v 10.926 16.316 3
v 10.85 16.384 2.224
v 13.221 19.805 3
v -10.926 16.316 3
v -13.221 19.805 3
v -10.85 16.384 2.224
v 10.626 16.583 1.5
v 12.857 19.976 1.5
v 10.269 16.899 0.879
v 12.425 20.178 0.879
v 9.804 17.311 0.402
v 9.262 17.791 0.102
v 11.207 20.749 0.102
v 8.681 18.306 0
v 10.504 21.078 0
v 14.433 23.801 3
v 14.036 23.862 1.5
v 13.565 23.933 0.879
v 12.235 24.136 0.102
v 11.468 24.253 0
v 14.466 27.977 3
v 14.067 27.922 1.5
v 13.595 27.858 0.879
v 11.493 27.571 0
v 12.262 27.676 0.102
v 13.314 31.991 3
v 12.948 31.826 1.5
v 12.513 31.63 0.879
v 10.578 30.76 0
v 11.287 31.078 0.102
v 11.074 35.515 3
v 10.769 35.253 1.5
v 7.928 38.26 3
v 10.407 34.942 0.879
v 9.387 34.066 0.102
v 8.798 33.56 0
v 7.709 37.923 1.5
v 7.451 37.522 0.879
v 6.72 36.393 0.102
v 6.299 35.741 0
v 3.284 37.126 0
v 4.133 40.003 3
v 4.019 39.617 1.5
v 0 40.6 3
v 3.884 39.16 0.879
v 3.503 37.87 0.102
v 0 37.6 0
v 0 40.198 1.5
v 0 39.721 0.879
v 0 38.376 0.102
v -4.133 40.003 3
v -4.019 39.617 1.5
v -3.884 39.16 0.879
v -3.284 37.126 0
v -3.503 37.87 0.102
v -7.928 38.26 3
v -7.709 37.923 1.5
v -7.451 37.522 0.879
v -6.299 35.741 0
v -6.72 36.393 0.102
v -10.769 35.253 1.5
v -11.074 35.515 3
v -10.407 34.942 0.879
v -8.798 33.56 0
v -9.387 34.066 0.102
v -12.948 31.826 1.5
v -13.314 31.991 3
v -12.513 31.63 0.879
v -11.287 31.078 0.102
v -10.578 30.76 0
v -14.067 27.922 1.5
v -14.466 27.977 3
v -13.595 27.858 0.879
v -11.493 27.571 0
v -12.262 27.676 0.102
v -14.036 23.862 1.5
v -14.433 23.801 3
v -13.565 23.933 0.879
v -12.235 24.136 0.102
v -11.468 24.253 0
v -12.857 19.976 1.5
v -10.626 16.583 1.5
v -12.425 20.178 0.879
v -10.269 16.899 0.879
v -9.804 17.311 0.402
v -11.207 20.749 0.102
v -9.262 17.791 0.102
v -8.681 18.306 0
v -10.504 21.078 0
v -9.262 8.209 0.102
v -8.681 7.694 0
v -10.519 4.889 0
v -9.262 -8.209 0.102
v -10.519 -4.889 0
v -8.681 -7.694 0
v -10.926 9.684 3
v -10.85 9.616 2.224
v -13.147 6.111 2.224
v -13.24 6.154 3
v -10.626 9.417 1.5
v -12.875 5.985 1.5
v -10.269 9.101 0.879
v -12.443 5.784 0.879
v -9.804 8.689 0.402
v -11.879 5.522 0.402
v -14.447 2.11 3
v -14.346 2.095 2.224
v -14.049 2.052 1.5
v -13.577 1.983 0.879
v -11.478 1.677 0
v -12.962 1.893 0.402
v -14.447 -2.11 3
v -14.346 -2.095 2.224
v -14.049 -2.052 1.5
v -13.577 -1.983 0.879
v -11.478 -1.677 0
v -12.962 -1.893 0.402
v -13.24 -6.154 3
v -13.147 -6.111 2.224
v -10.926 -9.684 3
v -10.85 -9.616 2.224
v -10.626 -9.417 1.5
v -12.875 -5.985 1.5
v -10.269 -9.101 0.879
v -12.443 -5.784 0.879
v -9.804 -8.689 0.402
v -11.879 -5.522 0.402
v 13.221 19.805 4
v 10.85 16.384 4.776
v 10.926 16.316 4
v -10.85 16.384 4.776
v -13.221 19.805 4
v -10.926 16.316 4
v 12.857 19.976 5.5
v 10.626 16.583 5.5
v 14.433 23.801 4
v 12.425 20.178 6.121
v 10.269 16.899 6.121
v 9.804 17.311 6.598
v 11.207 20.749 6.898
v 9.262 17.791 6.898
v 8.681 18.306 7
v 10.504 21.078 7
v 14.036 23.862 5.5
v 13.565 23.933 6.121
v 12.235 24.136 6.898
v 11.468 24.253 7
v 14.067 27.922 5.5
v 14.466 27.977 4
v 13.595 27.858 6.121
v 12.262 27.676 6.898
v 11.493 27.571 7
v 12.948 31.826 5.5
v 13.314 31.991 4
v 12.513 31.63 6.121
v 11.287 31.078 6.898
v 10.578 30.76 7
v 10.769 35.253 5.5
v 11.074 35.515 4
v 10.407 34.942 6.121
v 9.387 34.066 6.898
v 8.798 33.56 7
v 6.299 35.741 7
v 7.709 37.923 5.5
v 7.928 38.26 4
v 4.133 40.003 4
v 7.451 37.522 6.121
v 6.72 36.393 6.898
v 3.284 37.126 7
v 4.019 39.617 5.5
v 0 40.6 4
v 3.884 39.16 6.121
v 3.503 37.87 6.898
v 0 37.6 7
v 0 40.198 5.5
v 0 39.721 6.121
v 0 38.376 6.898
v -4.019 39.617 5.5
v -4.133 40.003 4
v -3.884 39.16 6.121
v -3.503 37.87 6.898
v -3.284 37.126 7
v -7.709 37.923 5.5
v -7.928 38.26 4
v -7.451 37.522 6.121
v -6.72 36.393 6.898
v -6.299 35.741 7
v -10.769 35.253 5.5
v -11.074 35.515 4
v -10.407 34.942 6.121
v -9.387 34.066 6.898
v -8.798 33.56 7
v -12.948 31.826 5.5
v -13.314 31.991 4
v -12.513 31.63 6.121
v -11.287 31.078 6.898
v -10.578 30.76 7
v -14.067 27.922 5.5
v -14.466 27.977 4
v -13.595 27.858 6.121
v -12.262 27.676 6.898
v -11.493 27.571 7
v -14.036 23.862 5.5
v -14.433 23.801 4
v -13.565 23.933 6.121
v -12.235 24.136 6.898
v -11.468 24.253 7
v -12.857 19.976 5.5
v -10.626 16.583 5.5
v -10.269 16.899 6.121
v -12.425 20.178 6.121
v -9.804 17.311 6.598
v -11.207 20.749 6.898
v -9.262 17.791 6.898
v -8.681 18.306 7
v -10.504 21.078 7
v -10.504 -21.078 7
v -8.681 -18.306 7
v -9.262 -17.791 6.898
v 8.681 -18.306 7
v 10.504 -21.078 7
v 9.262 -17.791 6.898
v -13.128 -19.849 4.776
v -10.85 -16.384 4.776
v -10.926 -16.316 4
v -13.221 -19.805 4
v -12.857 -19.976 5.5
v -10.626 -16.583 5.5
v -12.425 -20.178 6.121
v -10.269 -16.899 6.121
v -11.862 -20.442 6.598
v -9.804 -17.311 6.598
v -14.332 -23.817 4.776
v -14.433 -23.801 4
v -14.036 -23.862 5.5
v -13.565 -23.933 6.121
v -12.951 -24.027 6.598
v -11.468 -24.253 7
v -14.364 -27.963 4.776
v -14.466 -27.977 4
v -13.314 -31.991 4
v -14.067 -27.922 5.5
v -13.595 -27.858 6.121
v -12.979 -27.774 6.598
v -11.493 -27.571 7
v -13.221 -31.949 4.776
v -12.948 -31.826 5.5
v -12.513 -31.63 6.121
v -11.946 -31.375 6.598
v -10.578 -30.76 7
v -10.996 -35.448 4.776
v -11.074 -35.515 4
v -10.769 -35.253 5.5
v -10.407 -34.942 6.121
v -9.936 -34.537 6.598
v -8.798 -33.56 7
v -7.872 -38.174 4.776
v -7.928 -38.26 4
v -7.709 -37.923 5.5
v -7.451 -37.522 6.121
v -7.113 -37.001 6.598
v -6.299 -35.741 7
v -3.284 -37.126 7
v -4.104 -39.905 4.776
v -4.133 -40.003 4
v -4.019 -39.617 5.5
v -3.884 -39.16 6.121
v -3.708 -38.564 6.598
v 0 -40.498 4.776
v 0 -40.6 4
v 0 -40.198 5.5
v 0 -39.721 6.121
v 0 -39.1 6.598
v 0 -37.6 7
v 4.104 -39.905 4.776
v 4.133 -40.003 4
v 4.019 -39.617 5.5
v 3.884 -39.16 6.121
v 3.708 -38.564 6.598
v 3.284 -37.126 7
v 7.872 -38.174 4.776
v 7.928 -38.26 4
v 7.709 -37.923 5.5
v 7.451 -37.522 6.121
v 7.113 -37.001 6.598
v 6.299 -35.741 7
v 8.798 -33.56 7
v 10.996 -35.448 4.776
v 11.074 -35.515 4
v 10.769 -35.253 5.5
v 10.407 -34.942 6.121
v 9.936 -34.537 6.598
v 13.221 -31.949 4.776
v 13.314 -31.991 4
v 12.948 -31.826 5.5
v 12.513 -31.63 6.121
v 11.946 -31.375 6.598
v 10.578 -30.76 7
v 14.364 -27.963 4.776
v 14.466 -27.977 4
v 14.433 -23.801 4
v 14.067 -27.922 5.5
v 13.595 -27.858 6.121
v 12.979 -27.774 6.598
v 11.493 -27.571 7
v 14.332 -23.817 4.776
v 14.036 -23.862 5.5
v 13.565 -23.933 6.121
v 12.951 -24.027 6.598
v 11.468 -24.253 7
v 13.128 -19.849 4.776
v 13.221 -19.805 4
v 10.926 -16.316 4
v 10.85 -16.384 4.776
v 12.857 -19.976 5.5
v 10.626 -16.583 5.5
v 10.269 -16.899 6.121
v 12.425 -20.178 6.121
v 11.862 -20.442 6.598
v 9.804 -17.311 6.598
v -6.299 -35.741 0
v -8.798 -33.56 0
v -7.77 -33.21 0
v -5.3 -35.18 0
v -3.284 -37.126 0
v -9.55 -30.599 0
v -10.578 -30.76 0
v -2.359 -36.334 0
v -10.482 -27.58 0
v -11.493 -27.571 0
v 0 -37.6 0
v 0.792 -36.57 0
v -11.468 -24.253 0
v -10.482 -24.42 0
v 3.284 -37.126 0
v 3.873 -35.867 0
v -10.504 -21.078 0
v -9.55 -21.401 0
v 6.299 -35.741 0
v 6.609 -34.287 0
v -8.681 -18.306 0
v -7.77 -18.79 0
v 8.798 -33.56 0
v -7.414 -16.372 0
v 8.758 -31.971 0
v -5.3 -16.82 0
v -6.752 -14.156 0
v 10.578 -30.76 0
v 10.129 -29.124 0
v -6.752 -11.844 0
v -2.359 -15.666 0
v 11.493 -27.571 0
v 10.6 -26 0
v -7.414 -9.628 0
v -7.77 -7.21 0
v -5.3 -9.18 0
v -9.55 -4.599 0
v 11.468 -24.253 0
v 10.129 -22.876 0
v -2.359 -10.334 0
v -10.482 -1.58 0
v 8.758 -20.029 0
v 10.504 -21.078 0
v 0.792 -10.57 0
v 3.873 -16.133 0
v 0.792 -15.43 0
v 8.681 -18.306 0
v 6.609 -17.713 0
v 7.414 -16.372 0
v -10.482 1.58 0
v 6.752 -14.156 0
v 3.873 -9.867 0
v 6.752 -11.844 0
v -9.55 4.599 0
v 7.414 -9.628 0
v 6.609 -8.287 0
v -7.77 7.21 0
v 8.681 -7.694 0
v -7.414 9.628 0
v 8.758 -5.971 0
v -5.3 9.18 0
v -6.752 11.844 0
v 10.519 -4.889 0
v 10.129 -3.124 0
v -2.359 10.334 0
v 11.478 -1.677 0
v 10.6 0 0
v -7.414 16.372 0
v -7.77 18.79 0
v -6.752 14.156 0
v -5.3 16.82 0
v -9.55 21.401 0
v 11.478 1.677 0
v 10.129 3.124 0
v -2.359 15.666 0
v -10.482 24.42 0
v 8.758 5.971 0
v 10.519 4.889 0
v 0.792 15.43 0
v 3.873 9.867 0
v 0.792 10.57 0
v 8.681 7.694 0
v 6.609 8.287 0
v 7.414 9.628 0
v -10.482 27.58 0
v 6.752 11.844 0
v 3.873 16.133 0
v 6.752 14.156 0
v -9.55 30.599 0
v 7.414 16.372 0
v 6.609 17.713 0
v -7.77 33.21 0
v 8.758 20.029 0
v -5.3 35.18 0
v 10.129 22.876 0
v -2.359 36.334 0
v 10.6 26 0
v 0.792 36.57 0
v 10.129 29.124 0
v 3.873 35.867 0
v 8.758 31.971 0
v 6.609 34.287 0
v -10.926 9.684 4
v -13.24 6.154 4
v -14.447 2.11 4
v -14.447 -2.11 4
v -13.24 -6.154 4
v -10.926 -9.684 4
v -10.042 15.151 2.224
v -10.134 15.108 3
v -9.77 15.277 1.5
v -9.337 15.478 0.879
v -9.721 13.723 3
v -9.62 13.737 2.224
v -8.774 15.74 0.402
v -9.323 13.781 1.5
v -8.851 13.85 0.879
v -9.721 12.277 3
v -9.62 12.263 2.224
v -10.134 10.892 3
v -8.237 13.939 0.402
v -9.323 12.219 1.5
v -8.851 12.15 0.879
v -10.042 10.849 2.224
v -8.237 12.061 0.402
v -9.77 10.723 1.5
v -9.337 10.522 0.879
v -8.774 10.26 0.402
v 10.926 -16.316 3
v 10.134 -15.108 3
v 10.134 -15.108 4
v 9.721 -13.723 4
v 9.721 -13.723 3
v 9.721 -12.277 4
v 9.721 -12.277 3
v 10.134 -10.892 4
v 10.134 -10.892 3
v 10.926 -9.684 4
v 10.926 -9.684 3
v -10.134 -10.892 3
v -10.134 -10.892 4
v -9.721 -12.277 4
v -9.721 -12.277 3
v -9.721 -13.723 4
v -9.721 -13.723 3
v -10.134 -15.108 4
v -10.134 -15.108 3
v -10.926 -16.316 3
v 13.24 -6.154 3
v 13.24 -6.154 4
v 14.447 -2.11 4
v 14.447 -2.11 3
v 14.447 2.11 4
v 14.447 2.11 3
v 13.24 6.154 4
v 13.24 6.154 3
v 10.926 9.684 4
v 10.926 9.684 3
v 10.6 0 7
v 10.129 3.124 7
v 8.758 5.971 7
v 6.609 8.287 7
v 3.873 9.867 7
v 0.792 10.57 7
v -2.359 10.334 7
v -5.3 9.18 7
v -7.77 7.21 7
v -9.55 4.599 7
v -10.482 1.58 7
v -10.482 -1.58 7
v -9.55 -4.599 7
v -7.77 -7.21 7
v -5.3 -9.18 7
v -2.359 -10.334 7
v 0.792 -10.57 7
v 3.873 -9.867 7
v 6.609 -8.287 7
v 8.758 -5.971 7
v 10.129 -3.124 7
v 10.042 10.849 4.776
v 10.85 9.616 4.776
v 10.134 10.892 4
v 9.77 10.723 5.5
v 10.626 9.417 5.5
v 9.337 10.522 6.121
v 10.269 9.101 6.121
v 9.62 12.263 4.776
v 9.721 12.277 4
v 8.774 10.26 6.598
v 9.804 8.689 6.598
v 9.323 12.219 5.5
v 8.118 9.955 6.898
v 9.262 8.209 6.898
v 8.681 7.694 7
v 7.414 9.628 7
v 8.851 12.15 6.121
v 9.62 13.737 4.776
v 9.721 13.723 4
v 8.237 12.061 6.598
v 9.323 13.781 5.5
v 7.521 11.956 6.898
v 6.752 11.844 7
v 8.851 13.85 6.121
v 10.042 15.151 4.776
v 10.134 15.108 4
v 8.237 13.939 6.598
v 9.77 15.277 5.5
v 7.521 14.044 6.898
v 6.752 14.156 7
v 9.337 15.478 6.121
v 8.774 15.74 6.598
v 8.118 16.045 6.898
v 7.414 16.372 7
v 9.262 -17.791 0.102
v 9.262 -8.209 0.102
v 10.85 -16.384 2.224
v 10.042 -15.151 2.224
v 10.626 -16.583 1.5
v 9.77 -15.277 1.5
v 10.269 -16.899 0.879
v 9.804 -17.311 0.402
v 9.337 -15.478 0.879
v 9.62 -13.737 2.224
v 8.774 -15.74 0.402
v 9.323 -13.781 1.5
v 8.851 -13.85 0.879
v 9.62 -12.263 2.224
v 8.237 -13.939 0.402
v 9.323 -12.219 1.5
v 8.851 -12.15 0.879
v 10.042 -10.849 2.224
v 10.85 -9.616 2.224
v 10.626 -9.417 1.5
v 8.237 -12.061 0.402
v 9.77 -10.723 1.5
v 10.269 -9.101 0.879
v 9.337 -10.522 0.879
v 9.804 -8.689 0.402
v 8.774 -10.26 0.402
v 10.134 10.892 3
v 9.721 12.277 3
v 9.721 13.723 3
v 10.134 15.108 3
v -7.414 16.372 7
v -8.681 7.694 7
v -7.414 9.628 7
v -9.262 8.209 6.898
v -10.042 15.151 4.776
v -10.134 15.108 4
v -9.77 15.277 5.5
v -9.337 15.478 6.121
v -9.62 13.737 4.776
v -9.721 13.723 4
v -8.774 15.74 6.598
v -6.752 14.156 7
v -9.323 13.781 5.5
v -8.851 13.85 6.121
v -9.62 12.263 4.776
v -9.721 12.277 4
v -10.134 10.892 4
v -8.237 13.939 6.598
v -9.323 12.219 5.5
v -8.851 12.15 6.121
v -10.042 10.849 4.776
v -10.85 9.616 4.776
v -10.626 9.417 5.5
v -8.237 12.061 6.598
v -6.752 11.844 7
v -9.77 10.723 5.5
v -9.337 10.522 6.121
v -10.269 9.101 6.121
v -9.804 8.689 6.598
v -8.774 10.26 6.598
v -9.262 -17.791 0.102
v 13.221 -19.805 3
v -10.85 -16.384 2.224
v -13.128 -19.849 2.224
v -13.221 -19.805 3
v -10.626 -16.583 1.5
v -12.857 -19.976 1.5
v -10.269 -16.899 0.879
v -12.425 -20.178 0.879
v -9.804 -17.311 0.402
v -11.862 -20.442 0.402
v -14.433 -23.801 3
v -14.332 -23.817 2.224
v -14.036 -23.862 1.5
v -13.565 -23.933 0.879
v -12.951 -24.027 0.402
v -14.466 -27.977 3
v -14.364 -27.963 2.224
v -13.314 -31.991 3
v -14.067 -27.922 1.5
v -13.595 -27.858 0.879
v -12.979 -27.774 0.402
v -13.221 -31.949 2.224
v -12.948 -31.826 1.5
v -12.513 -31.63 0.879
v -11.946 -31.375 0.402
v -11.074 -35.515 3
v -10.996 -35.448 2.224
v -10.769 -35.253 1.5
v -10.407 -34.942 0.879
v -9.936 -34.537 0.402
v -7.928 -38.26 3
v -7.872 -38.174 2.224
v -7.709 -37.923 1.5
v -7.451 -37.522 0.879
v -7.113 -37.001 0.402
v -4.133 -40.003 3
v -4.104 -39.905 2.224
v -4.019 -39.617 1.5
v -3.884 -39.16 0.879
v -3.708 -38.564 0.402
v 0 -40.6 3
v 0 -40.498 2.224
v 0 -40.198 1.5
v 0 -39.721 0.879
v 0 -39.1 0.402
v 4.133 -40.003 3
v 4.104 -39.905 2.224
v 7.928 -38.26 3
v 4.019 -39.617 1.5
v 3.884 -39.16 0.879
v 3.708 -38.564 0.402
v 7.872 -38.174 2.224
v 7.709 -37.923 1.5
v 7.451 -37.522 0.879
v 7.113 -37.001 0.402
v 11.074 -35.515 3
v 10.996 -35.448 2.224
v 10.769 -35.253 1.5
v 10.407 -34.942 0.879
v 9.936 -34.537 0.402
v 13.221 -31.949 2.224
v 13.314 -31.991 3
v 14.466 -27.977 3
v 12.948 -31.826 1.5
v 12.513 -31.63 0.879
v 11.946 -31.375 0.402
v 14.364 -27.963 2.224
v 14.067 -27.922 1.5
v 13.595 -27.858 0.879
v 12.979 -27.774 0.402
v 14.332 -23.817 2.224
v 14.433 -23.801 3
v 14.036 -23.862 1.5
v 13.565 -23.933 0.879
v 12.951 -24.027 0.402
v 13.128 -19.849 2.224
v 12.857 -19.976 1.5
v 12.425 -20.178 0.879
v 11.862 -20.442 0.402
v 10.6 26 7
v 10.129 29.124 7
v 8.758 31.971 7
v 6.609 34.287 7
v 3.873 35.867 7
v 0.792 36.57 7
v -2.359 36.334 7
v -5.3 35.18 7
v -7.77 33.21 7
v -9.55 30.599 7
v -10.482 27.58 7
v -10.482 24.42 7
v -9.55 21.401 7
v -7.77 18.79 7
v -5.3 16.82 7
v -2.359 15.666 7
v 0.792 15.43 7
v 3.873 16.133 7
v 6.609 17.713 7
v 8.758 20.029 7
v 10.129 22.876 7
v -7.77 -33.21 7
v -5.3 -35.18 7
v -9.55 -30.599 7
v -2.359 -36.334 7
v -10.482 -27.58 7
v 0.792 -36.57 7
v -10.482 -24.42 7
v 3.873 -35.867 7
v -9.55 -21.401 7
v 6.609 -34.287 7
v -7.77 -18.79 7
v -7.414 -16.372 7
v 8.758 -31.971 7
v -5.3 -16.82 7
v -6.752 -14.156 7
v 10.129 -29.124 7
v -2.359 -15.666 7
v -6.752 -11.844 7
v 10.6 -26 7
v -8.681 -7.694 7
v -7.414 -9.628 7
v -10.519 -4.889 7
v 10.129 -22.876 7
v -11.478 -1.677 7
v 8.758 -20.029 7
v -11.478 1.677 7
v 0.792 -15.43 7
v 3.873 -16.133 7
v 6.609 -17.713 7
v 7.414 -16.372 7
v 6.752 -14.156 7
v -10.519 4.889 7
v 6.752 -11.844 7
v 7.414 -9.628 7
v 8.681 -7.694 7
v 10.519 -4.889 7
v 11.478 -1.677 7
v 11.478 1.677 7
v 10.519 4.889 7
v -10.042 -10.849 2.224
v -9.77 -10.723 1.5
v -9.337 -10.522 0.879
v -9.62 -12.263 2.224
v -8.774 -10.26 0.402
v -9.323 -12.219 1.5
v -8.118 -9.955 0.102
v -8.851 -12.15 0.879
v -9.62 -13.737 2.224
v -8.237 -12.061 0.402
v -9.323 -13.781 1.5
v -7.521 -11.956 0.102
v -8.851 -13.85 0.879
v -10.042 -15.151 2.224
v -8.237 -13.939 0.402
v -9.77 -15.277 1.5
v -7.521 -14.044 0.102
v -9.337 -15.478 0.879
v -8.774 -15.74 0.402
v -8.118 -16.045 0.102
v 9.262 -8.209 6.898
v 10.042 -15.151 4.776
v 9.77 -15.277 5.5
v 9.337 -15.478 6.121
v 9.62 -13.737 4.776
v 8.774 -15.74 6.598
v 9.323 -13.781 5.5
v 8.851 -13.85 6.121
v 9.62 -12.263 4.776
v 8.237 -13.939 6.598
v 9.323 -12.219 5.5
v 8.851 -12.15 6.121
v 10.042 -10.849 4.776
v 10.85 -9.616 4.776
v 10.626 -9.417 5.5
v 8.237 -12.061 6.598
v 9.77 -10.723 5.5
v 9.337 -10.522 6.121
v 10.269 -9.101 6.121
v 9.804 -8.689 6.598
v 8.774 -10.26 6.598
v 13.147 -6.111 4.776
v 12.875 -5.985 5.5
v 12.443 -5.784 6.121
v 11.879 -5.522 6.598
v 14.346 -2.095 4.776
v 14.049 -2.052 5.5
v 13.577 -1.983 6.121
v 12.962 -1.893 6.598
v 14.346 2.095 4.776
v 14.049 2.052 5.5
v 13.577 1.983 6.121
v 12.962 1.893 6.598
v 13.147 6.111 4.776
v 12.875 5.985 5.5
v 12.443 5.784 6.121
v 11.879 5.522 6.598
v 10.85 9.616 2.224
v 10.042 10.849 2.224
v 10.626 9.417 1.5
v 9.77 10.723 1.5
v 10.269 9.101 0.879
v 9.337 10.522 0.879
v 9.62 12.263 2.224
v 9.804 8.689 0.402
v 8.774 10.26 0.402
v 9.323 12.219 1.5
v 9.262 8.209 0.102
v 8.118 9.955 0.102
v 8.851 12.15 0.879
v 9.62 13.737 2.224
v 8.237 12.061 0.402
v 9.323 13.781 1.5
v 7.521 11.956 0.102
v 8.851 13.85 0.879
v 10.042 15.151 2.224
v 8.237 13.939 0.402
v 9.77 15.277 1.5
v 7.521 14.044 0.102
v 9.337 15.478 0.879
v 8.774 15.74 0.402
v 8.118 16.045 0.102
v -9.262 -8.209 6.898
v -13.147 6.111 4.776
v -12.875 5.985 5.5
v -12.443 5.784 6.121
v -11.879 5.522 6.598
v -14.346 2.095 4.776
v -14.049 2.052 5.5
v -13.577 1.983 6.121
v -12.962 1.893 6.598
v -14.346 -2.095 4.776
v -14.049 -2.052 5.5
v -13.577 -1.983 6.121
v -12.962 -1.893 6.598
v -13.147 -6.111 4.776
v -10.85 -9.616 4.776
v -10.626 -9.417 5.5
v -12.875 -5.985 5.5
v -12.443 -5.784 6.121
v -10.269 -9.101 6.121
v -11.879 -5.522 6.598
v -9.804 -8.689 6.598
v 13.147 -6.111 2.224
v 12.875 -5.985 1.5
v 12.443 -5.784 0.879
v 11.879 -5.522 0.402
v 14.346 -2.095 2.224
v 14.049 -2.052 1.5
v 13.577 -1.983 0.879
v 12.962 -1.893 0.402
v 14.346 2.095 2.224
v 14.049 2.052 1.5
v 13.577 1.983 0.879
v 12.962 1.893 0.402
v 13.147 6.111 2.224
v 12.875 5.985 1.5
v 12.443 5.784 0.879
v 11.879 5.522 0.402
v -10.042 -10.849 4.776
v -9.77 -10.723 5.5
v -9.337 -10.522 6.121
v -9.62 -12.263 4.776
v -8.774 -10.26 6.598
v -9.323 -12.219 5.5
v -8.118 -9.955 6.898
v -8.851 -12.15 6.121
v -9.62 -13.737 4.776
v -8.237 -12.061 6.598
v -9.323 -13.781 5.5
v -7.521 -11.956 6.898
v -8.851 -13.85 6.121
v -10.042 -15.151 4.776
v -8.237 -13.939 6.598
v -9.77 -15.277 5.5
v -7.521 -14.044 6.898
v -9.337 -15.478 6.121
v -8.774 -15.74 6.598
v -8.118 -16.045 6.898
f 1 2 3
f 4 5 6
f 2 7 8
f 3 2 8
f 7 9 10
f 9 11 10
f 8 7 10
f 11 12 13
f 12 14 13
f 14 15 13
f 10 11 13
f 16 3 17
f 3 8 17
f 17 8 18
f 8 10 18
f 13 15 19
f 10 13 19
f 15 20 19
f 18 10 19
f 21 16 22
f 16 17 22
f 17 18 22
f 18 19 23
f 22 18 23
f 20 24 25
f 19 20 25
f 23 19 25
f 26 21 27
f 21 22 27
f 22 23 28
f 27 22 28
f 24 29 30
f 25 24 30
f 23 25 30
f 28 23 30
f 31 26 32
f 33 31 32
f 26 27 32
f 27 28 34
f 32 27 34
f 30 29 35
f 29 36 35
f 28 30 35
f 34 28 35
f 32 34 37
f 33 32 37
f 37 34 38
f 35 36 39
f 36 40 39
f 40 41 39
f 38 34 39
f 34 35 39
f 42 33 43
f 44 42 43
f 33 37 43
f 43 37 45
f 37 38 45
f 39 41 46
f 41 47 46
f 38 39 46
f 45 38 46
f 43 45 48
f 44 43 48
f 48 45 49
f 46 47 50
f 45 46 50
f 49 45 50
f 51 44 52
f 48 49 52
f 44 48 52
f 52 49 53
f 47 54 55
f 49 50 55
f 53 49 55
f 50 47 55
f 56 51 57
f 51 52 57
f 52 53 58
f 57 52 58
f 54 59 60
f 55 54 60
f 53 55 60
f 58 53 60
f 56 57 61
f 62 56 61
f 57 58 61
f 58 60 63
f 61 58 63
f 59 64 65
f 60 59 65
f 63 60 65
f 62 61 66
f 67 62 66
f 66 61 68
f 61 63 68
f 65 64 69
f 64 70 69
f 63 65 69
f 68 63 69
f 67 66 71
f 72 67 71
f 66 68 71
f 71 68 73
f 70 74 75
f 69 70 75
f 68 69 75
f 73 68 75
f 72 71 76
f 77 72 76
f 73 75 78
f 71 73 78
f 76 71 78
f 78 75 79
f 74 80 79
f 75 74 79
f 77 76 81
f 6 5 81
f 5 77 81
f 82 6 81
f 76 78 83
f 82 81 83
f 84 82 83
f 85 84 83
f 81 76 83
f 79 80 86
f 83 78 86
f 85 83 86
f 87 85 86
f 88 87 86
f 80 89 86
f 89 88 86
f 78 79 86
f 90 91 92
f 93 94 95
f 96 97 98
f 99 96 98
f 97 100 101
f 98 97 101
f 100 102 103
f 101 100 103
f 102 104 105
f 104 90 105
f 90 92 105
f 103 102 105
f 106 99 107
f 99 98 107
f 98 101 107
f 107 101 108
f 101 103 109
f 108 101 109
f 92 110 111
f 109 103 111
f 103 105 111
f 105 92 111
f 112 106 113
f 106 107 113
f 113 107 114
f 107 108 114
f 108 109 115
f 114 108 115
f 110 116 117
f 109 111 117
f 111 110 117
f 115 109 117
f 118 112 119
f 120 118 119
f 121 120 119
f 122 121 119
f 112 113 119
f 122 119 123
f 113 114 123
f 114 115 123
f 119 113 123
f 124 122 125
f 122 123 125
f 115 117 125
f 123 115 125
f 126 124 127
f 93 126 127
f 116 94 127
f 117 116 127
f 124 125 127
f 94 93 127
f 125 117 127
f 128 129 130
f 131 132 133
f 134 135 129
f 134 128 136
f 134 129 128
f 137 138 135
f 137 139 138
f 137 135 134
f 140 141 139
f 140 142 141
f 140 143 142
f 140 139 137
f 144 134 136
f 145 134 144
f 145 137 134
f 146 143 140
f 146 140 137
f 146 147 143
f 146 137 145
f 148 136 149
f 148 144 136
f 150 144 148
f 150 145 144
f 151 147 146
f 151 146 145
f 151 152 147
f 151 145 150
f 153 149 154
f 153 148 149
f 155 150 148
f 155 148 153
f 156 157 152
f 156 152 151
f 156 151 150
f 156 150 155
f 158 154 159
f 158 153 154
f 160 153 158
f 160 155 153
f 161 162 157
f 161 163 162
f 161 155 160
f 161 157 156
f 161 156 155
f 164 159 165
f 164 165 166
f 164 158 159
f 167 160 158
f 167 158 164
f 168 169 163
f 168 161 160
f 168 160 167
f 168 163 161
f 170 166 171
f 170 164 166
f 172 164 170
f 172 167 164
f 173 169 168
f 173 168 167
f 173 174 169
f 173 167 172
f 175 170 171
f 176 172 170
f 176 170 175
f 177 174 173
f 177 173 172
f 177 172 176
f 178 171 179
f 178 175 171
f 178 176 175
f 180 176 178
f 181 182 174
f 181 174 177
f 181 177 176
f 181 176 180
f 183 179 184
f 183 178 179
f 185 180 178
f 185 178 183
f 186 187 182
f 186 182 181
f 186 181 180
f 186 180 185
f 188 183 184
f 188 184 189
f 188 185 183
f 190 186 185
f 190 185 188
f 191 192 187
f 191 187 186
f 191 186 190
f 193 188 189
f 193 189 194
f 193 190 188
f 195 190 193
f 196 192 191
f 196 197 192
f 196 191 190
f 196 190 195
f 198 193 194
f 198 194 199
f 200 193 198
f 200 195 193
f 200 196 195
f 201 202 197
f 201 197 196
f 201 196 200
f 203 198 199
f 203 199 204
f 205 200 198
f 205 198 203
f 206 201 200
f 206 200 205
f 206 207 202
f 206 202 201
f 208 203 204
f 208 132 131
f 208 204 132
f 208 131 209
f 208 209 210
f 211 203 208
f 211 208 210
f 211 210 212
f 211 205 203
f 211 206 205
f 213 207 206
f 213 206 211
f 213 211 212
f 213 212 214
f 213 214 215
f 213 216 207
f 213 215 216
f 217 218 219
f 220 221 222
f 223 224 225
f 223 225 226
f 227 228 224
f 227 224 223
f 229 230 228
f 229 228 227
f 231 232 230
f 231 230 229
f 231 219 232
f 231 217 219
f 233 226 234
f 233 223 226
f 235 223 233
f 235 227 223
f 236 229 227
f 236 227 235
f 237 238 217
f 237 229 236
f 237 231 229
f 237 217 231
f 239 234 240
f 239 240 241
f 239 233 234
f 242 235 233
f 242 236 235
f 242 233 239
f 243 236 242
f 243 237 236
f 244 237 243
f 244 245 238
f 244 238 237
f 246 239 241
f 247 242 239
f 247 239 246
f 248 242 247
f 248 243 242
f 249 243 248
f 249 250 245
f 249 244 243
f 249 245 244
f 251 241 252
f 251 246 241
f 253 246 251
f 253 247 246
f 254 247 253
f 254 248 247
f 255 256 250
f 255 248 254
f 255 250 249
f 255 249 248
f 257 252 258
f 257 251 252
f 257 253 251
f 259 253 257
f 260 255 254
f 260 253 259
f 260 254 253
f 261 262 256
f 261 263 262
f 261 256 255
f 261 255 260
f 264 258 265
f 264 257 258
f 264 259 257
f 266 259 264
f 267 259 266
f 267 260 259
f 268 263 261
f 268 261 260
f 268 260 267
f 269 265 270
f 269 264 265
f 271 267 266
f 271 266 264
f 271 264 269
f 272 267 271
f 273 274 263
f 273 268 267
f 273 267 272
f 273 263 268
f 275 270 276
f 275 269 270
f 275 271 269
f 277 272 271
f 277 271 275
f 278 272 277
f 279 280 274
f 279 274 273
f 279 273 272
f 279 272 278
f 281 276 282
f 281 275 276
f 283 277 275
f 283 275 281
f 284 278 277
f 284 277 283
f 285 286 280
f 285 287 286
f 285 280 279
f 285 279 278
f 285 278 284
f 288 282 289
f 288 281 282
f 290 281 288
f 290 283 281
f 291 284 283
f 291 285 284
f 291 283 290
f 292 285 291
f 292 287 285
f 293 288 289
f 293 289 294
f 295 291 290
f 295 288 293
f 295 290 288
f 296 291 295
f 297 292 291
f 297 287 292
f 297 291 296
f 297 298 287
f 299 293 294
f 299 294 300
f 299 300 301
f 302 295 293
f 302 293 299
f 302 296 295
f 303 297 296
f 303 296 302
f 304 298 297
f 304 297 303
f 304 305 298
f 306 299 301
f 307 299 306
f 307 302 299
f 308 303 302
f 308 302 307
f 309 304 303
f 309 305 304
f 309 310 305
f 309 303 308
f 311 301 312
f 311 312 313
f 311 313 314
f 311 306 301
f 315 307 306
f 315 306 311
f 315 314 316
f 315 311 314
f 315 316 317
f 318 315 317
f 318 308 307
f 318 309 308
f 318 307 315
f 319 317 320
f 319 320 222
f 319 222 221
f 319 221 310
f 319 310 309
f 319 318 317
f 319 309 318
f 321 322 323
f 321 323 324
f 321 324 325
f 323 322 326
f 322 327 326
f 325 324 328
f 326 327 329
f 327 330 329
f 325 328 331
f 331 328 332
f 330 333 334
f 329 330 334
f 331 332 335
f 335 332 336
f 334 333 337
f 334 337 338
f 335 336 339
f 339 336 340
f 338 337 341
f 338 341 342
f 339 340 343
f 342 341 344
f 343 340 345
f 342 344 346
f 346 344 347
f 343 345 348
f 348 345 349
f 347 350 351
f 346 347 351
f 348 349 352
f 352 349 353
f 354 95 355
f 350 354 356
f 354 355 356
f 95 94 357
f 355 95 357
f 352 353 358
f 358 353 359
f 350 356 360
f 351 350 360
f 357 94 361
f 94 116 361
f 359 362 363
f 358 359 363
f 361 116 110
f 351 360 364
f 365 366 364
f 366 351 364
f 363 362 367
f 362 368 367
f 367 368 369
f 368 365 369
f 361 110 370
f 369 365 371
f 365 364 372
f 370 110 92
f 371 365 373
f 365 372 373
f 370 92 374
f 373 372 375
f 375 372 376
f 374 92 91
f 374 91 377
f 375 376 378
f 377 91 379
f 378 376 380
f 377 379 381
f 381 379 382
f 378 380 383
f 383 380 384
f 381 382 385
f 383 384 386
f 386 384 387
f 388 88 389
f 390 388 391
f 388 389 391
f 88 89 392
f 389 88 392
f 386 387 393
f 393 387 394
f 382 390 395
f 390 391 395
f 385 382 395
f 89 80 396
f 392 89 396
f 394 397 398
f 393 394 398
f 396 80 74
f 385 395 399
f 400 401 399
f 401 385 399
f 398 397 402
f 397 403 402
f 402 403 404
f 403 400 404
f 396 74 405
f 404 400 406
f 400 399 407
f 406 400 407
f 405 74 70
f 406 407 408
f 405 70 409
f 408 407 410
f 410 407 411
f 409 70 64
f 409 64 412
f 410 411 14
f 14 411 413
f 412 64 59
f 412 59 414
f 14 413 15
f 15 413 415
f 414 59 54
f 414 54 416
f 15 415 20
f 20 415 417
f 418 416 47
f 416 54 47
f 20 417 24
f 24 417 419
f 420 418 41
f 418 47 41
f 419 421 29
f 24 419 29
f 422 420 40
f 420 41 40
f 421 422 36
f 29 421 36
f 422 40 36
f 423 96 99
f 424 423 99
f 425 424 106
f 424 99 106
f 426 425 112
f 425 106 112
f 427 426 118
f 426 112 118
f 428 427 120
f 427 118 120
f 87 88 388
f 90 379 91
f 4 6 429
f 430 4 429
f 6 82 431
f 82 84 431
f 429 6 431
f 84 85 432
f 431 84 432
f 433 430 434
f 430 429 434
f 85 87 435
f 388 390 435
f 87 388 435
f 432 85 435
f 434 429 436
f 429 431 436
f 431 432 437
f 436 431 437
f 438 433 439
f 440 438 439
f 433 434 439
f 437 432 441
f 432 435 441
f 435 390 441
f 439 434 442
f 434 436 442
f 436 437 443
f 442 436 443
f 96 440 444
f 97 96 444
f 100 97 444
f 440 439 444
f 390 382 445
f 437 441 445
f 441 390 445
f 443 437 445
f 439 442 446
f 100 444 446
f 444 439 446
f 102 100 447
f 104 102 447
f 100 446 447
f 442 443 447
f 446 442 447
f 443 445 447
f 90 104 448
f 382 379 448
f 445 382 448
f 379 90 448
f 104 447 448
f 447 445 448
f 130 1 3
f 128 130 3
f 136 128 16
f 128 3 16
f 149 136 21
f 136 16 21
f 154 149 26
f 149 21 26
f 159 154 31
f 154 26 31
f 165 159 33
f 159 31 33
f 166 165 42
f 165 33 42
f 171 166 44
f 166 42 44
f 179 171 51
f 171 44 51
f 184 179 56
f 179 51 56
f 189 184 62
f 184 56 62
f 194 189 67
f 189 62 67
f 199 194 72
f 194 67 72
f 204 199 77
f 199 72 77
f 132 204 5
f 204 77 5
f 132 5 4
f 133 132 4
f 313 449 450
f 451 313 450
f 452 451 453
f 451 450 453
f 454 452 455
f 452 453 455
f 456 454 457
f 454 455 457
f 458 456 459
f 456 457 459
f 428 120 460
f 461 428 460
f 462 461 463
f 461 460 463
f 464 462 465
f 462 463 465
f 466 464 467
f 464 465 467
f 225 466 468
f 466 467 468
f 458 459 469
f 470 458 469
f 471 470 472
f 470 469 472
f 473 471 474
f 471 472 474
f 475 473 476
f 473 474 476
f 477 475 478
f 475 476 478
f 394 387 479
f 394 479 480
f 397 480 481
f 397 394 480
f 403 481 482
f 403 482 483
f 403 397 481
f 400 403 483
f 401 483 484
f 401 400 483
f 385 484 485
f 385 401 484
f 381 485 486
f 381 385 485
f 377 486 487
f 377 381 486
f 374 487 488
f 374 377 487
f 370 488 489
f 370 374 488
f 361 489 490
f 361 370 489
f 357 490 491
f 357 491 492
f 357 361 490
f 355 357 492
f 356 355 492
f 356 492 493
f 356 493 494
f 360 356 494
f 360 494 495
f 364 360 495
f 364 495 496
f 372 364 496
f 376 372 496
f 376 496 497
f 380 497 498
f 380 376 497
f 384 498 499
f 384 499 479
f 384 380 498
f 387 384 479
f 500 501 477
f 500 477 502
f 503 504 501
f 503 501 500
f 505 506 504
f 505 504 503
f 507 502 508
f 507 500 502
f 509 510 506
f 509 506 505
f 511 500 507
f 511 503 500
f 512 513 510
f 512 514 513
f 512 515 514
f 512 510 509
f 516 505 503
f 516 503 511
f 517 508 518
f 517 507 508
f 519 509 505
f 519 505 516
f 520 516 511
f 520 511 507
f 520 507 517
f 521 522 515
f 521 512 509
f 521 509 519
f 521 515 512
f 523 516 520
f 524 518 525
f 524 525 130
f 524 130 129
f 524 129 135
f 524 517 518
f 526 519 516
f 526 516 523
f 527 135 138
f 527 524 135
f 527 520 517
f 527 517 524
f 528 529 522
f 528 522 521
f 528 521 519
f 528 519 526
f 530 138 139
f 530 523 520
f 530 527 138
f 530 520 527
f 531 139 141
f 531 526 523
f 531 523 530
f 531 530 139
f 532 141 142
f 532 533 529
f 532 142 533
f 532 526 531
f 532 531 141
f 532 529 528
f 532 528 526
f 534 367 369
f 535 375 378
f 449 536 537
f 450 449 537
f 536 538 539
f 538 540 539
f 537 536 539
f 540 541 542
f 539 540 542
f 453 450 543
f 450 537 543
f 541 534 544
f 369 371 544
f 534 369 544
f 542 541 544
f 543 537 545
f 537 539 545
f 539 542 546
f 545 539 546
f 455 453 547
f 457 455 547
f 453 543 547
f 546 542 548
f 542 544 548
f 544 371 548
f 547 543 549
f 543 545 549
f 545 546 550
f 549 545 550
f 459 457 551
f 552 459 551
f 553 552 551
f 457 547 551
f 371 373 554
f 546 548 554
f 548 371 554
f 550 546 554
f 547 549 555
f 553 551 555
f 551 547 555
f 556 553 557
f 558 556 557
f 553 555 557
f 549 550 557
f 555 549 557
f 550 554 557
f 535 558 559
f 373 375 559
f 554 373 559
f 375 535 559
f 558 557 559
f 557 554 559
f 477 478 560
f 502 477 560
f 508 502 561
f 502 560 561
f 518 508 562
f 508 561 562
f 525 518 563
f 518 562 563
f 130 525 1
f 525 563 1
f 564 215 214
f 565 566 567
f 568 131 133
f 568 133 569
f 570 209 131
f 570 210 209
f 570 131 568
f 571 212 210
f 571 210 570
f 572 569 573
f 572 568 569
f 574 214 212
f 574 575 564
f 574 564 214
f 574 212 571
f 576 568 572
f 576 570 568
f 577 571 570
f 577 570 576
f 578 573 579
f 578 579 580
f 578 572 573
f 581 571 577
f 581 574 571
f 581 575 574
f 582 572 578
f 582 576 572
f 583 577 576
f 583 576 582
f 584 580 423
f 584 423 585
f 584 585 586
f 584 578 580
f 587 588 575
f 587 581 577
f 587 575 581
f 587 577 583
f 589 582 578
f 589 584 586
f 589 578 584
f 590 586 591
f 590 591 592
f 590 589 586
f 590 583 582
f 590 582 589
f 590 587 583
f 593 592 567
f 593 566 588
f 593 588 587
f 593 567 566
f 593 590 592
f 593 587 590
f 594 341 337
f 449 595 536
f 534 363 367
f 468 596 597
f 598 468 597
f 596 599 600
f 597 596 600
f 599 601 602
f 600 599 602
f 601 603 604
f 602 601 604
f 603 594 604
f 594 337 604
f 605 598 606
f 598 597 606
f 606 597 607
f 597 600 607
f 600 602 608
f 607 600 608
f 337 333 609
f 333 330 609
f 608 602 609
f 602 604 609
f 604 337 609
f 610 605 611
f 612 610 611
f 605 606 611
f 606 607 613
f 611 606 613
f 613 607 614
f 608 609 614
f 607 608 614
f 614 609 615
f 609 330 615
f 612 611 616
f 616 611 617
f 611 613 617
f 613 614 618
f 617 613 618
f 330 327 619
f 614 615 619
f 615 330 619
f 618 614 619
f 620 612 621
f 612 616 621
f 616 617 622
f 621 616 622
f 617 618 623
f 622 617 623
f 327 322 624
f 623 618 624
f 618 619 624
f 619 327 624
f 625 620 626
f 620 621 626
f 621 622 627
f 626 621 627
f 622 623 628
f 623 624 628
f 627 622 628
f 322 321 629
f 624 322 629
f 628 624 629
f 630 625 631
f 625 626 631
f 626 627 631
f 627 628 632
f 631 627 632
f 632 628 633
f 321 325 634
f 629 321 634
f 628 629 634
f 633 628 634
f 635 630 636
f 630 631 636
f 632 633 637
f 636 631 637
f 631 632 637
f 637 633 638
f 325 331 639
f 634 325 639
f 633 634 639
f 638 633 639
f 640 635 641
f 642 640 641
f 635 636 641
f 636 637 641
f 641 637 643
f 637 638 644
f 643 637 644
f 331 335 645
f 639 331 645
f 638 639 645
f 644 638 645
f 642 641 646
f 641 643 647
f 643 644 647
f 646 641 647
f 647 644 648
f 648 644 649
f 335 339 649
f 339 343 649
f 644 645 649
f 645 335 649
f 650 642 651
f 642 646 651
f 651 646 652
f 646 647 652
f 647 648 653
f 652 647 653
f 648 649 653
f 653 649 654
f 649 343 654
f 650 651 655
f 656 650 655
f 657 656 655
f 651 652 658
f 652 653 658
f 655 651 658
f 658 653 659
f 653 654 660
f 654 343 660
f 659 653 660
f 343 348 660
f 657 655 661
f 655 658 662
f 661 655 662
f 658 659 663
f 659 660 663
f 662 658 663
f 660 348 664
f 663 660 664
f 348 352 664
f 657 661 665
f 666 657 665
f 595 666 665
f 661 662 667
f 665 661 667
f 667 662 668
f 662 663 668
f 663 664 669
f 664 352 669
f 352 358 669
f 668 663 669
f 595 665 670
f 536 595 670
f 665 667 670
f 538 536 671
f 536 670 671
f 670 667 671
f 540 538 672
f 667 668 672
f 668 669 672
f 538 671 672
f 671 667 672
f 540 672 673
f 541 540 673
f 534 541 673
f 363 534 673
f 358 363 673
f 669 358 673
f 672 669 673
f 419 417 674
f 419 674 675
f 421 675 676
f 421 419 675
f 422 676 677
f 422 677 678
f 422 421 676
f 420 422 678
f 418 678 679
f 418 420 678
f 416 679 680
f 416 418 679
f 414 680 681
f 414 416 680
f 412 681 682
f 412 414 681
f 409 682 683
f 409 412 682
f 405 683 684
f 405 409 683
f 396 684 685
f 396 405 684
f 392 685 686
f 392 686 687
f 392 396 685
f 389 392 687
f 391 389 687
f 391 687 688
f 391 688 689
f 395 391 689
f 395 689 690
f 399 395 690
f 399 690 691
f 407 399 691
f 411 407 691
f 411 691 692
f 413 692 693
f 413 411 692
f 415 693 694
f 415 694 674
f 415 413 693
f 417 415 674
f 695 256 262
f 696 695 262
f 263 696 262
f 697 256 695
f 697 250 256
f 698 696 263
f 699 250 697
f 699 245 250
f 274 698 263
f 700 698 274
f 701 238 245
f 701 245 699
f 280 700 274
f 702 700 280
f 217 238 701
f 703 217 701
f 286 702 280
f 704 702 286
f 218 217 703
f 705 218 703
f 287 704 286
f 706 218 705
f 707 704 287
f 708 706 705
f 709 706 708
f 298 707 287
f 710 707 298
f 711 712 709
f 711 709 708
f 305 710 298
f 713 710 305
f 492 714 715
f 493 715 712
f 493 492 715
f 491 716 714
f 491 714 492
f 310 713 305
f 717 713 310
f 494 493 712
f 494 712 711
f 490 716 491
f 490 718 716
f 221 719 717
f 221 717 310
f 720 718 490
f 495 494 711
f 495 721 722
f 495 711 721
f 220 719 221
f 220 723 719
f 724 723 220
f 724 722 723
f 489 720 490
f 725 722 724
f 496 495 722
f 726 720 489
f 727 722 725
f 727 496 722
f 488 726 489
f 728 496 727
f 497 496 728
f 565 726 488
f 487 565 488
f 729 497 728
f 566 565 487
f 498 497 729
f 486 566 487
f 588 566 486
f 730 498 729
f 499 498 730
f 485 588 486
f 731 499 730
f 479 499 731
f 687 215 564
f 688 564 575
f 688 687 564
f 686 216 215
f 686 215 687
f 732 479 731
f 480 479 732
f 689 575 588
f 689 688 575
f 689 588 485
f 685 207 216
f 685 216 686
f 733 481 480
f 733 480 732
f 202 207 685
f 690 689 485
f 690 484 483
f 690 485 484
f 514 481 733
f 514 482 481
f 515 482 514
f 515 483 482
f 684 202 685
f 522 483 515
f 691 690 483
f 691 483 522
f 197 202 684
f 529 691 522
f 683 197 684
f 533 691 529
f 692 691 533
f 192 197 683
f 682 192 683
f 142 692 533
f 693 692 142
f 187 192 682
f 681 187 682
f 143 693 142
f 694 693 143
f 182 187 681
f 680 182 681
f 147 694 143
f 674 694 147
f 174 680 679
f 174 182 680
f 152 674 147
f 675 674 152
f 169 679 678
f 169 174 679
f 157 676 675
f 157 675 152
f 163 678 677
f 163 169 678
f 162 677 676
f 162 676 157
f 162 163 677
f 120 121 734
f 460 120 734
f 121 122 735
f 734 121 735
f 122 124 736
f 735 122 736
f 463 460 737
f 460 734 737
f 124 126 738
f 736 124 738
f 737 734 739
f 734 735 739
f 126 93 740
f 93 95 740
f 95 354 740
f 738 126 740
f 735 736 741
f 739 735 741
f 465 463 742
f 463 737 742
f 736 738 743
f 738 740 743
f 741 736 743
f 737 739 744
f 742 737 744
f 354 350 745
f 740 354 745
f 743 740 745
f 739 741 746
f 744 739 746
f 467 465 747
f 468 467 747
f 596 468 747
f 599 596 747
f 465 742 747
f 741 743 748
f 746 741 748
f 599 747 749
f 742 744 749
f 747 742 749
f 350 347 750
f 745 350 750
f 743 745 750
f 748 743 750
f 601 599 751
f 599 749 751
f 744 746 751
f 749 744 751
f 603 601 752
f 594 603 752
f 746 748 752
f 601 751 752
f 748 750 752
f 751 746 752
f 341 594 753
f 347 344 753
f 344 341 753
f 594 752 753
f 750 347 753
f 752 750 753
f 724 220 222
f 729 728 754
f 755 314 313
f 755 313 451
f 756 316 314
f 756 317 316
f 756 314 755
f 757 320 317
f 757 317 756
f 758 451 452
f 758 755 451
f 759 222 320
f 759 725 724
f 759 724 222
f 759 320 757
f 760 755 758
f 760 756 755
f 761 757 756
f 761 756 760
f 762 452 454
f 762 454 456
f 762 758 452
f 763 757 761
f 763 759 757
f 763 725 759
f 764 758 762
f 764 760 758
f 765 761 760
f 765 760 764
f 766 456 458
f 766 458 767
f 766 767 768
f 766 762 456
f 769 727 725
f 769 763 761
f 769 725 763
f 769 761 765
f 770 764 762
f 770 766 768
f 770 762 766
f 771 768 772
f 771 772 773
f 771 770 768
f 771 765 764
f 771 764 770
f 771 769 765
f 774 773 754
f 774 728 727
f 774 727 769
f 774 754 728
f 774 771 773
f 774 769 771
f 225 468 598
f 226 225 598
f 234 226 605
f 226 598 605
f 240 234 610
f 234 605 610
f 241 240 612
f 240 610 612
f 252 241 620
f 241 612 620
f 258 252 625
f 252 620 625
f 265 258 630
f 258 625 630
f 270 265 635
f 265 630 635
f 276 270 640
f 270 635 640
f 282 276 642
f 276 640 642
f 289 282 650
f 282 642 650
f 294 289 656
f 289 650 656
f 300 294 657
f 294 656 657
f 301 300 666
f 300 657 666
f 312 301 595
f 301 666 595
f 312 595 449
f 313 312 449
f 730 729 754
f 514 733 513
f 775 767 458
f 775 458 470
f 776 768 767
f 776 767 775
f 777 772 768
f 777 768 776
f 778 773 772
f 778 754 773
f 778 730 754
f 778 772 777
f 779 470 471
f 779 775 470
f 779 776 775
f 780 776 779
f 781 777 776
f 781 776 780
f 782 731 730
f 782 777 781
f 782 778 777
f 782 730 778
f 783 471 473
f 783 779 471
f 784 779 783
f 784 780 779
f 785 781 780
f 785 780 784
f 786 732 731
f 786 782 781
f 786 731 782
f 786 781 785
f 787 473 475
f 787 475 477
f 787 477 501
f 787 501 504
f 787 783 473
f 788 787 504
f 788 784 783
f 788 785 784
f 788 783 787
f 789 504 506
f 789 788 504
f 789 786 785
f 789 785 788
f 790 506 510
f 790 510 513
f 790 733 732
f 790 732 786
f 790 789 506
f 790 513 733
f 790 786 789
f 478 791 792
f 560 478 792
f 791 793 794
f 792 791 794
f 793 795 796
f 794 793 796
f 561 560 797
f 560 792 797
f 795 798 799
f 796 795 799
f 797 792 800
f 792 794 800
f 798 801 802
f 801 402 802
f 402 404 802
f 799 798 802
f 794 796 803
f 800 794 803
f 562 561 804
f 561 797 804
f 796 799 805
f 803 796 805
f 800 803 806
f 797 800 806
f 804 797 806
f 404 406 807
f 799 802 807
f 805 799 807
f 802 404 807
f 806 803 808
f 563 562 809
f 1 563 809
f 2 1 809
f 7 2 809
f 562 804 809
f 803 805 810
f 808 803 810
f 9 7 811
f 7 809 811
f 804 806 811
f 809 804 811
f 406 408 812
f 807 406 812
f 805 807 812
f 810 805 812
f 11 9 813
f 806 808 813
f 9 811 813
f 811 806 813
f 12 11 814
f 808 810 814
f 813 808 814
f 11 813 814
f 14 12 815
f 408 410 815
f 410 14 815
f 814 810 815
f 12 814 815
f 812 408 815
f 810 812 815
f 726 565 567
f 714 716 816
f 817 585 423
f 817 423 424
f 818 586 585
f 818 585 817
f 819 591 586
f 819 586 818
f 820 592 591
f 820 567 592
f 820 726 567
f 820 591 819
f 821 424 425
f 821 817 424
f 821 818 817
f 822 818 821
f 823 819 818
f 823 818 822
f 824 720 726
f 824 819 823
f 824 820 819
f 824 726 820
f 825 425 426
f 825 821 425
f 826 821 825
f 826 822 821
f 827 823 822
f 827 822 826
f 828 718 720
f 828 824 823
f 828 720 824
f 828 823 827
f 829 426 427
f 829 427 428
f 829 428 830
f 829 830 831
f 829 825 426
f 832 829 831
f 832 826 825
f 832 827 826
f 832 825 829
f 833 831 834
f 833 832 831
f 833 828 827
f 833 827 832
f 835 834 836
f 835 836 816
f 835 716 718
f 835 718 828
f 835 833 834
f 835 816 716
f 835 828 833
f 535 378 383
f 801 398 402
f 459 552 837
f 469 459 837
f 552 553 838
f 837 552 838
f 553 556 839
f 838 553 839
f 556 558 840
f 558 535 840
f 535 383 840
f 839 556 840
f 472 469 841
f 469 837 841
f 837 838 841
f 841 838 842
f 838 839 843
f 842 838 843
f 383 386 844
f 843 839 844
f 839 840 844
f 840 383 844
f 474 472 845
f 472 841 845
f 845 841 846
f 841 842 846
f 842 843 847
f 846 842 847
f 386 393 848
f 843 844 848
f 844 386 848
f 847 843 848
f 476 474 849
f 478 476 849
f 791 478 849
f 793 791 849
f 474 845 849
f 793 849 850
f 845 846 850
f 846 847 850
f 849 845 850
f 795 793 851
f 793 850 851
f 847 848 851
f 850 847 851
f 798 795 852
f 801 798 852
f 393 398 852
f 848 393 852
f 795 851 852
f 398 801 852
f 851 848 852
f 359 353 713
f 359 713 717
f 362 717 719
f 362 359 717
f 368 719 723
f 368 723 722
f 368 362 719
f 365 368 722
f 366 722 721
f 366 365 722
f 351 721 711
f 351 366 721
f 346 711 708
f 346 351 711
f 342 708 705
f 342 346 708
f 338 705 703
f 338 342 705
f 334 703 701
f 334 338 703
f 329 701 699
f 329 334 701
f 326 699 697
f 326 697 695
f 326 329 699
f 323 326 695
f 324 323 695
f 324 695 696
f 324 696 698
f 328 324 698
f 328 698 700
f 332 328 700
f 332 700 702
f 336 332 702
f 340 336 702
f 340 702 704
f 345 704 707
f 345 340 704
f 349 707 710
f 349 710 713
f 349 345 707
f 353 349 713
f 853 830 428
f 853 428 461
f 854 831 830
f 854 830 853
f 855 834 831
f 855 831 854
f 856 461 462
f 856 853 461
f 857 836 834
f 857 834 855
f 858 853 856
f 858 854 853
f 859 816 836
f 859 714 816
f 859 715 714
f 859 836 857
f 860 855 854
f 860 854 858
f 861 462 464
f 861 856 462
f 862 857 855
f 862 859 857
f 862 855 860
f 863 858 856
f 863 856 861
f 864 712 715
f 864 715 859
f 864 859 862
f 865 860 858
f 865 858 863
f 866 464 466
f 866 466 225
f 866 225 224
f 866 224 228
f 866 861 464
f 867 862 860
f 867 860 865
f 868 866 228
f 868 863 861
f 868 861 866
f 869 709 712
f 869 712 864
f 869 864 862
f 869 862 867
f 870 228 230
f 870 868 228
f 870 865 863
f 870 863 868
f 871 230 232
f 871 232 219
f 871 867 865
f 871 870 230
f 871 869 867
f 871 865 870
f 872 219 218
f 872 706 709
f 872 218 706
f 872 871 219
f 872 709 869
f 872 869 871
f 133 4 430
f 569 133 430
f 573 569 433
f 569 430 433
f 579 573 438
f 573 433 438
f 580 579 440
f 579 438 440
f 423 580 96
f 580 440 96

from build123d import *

# Parameters (mm, degrees)
F0_R     = 10.6
F1_DEPTH = 7
F2_R     = 3


with BuildPart() as f1:
    # F0 (on Top) → F1 (new body)
    with BuildSketch(Plane.XY):
        with BuildLine():
            ThreePointArc((10.926411, 16.316327), (0, 40.6), (-10.926411, 16.316327))
            ThreePointArc((-10.926411, 16.316327), (-9.668333, 13), (-10.926411, 9.683673))
            ThreePointArc((-10.926411, 9.683673), (-14.6, 0), (-10.926411, -9.683673))
            ThreePointArc((-10.926411, -9.683673), (-9.668333, -13), (-10.926411, -16.316327))
            ThreePointArc((-10.926411, -16.316327), (0, -40.6), (10.926411, -16.316327))
            ThreePointArc((10.926411, -16.316327), (9.668333, -13), (10.926411, -9.683673))
            ThreePointArc((10.926411, -9.683673), (14.6, 0), (10.926411, 9.683673))
            ThreePointArc((10.926411, 9.683673), (9.668333, 13), (10.926411, 16.316327))
        make_face()
        with Locations((0, -26)):
            Circle(F0_R, mode=Mode.SUBTRACT)
        Circle(F0_R, mode=Mode.SUBTRACT)
        with Locations((0, 26)):
            Circle(F0_R, mode=Mode.SUBTRACT)
    extrude(amount=F1_DEPTH)

    # F2
    f2_edges = [f1.edges().sort_by_distance(p)[0] for p in [
        (0, 40.6, 7),
        (0, 40.6, 0),
    ]]
    fillet(f2_edges, radius=F2_R)


solid = f1.part
